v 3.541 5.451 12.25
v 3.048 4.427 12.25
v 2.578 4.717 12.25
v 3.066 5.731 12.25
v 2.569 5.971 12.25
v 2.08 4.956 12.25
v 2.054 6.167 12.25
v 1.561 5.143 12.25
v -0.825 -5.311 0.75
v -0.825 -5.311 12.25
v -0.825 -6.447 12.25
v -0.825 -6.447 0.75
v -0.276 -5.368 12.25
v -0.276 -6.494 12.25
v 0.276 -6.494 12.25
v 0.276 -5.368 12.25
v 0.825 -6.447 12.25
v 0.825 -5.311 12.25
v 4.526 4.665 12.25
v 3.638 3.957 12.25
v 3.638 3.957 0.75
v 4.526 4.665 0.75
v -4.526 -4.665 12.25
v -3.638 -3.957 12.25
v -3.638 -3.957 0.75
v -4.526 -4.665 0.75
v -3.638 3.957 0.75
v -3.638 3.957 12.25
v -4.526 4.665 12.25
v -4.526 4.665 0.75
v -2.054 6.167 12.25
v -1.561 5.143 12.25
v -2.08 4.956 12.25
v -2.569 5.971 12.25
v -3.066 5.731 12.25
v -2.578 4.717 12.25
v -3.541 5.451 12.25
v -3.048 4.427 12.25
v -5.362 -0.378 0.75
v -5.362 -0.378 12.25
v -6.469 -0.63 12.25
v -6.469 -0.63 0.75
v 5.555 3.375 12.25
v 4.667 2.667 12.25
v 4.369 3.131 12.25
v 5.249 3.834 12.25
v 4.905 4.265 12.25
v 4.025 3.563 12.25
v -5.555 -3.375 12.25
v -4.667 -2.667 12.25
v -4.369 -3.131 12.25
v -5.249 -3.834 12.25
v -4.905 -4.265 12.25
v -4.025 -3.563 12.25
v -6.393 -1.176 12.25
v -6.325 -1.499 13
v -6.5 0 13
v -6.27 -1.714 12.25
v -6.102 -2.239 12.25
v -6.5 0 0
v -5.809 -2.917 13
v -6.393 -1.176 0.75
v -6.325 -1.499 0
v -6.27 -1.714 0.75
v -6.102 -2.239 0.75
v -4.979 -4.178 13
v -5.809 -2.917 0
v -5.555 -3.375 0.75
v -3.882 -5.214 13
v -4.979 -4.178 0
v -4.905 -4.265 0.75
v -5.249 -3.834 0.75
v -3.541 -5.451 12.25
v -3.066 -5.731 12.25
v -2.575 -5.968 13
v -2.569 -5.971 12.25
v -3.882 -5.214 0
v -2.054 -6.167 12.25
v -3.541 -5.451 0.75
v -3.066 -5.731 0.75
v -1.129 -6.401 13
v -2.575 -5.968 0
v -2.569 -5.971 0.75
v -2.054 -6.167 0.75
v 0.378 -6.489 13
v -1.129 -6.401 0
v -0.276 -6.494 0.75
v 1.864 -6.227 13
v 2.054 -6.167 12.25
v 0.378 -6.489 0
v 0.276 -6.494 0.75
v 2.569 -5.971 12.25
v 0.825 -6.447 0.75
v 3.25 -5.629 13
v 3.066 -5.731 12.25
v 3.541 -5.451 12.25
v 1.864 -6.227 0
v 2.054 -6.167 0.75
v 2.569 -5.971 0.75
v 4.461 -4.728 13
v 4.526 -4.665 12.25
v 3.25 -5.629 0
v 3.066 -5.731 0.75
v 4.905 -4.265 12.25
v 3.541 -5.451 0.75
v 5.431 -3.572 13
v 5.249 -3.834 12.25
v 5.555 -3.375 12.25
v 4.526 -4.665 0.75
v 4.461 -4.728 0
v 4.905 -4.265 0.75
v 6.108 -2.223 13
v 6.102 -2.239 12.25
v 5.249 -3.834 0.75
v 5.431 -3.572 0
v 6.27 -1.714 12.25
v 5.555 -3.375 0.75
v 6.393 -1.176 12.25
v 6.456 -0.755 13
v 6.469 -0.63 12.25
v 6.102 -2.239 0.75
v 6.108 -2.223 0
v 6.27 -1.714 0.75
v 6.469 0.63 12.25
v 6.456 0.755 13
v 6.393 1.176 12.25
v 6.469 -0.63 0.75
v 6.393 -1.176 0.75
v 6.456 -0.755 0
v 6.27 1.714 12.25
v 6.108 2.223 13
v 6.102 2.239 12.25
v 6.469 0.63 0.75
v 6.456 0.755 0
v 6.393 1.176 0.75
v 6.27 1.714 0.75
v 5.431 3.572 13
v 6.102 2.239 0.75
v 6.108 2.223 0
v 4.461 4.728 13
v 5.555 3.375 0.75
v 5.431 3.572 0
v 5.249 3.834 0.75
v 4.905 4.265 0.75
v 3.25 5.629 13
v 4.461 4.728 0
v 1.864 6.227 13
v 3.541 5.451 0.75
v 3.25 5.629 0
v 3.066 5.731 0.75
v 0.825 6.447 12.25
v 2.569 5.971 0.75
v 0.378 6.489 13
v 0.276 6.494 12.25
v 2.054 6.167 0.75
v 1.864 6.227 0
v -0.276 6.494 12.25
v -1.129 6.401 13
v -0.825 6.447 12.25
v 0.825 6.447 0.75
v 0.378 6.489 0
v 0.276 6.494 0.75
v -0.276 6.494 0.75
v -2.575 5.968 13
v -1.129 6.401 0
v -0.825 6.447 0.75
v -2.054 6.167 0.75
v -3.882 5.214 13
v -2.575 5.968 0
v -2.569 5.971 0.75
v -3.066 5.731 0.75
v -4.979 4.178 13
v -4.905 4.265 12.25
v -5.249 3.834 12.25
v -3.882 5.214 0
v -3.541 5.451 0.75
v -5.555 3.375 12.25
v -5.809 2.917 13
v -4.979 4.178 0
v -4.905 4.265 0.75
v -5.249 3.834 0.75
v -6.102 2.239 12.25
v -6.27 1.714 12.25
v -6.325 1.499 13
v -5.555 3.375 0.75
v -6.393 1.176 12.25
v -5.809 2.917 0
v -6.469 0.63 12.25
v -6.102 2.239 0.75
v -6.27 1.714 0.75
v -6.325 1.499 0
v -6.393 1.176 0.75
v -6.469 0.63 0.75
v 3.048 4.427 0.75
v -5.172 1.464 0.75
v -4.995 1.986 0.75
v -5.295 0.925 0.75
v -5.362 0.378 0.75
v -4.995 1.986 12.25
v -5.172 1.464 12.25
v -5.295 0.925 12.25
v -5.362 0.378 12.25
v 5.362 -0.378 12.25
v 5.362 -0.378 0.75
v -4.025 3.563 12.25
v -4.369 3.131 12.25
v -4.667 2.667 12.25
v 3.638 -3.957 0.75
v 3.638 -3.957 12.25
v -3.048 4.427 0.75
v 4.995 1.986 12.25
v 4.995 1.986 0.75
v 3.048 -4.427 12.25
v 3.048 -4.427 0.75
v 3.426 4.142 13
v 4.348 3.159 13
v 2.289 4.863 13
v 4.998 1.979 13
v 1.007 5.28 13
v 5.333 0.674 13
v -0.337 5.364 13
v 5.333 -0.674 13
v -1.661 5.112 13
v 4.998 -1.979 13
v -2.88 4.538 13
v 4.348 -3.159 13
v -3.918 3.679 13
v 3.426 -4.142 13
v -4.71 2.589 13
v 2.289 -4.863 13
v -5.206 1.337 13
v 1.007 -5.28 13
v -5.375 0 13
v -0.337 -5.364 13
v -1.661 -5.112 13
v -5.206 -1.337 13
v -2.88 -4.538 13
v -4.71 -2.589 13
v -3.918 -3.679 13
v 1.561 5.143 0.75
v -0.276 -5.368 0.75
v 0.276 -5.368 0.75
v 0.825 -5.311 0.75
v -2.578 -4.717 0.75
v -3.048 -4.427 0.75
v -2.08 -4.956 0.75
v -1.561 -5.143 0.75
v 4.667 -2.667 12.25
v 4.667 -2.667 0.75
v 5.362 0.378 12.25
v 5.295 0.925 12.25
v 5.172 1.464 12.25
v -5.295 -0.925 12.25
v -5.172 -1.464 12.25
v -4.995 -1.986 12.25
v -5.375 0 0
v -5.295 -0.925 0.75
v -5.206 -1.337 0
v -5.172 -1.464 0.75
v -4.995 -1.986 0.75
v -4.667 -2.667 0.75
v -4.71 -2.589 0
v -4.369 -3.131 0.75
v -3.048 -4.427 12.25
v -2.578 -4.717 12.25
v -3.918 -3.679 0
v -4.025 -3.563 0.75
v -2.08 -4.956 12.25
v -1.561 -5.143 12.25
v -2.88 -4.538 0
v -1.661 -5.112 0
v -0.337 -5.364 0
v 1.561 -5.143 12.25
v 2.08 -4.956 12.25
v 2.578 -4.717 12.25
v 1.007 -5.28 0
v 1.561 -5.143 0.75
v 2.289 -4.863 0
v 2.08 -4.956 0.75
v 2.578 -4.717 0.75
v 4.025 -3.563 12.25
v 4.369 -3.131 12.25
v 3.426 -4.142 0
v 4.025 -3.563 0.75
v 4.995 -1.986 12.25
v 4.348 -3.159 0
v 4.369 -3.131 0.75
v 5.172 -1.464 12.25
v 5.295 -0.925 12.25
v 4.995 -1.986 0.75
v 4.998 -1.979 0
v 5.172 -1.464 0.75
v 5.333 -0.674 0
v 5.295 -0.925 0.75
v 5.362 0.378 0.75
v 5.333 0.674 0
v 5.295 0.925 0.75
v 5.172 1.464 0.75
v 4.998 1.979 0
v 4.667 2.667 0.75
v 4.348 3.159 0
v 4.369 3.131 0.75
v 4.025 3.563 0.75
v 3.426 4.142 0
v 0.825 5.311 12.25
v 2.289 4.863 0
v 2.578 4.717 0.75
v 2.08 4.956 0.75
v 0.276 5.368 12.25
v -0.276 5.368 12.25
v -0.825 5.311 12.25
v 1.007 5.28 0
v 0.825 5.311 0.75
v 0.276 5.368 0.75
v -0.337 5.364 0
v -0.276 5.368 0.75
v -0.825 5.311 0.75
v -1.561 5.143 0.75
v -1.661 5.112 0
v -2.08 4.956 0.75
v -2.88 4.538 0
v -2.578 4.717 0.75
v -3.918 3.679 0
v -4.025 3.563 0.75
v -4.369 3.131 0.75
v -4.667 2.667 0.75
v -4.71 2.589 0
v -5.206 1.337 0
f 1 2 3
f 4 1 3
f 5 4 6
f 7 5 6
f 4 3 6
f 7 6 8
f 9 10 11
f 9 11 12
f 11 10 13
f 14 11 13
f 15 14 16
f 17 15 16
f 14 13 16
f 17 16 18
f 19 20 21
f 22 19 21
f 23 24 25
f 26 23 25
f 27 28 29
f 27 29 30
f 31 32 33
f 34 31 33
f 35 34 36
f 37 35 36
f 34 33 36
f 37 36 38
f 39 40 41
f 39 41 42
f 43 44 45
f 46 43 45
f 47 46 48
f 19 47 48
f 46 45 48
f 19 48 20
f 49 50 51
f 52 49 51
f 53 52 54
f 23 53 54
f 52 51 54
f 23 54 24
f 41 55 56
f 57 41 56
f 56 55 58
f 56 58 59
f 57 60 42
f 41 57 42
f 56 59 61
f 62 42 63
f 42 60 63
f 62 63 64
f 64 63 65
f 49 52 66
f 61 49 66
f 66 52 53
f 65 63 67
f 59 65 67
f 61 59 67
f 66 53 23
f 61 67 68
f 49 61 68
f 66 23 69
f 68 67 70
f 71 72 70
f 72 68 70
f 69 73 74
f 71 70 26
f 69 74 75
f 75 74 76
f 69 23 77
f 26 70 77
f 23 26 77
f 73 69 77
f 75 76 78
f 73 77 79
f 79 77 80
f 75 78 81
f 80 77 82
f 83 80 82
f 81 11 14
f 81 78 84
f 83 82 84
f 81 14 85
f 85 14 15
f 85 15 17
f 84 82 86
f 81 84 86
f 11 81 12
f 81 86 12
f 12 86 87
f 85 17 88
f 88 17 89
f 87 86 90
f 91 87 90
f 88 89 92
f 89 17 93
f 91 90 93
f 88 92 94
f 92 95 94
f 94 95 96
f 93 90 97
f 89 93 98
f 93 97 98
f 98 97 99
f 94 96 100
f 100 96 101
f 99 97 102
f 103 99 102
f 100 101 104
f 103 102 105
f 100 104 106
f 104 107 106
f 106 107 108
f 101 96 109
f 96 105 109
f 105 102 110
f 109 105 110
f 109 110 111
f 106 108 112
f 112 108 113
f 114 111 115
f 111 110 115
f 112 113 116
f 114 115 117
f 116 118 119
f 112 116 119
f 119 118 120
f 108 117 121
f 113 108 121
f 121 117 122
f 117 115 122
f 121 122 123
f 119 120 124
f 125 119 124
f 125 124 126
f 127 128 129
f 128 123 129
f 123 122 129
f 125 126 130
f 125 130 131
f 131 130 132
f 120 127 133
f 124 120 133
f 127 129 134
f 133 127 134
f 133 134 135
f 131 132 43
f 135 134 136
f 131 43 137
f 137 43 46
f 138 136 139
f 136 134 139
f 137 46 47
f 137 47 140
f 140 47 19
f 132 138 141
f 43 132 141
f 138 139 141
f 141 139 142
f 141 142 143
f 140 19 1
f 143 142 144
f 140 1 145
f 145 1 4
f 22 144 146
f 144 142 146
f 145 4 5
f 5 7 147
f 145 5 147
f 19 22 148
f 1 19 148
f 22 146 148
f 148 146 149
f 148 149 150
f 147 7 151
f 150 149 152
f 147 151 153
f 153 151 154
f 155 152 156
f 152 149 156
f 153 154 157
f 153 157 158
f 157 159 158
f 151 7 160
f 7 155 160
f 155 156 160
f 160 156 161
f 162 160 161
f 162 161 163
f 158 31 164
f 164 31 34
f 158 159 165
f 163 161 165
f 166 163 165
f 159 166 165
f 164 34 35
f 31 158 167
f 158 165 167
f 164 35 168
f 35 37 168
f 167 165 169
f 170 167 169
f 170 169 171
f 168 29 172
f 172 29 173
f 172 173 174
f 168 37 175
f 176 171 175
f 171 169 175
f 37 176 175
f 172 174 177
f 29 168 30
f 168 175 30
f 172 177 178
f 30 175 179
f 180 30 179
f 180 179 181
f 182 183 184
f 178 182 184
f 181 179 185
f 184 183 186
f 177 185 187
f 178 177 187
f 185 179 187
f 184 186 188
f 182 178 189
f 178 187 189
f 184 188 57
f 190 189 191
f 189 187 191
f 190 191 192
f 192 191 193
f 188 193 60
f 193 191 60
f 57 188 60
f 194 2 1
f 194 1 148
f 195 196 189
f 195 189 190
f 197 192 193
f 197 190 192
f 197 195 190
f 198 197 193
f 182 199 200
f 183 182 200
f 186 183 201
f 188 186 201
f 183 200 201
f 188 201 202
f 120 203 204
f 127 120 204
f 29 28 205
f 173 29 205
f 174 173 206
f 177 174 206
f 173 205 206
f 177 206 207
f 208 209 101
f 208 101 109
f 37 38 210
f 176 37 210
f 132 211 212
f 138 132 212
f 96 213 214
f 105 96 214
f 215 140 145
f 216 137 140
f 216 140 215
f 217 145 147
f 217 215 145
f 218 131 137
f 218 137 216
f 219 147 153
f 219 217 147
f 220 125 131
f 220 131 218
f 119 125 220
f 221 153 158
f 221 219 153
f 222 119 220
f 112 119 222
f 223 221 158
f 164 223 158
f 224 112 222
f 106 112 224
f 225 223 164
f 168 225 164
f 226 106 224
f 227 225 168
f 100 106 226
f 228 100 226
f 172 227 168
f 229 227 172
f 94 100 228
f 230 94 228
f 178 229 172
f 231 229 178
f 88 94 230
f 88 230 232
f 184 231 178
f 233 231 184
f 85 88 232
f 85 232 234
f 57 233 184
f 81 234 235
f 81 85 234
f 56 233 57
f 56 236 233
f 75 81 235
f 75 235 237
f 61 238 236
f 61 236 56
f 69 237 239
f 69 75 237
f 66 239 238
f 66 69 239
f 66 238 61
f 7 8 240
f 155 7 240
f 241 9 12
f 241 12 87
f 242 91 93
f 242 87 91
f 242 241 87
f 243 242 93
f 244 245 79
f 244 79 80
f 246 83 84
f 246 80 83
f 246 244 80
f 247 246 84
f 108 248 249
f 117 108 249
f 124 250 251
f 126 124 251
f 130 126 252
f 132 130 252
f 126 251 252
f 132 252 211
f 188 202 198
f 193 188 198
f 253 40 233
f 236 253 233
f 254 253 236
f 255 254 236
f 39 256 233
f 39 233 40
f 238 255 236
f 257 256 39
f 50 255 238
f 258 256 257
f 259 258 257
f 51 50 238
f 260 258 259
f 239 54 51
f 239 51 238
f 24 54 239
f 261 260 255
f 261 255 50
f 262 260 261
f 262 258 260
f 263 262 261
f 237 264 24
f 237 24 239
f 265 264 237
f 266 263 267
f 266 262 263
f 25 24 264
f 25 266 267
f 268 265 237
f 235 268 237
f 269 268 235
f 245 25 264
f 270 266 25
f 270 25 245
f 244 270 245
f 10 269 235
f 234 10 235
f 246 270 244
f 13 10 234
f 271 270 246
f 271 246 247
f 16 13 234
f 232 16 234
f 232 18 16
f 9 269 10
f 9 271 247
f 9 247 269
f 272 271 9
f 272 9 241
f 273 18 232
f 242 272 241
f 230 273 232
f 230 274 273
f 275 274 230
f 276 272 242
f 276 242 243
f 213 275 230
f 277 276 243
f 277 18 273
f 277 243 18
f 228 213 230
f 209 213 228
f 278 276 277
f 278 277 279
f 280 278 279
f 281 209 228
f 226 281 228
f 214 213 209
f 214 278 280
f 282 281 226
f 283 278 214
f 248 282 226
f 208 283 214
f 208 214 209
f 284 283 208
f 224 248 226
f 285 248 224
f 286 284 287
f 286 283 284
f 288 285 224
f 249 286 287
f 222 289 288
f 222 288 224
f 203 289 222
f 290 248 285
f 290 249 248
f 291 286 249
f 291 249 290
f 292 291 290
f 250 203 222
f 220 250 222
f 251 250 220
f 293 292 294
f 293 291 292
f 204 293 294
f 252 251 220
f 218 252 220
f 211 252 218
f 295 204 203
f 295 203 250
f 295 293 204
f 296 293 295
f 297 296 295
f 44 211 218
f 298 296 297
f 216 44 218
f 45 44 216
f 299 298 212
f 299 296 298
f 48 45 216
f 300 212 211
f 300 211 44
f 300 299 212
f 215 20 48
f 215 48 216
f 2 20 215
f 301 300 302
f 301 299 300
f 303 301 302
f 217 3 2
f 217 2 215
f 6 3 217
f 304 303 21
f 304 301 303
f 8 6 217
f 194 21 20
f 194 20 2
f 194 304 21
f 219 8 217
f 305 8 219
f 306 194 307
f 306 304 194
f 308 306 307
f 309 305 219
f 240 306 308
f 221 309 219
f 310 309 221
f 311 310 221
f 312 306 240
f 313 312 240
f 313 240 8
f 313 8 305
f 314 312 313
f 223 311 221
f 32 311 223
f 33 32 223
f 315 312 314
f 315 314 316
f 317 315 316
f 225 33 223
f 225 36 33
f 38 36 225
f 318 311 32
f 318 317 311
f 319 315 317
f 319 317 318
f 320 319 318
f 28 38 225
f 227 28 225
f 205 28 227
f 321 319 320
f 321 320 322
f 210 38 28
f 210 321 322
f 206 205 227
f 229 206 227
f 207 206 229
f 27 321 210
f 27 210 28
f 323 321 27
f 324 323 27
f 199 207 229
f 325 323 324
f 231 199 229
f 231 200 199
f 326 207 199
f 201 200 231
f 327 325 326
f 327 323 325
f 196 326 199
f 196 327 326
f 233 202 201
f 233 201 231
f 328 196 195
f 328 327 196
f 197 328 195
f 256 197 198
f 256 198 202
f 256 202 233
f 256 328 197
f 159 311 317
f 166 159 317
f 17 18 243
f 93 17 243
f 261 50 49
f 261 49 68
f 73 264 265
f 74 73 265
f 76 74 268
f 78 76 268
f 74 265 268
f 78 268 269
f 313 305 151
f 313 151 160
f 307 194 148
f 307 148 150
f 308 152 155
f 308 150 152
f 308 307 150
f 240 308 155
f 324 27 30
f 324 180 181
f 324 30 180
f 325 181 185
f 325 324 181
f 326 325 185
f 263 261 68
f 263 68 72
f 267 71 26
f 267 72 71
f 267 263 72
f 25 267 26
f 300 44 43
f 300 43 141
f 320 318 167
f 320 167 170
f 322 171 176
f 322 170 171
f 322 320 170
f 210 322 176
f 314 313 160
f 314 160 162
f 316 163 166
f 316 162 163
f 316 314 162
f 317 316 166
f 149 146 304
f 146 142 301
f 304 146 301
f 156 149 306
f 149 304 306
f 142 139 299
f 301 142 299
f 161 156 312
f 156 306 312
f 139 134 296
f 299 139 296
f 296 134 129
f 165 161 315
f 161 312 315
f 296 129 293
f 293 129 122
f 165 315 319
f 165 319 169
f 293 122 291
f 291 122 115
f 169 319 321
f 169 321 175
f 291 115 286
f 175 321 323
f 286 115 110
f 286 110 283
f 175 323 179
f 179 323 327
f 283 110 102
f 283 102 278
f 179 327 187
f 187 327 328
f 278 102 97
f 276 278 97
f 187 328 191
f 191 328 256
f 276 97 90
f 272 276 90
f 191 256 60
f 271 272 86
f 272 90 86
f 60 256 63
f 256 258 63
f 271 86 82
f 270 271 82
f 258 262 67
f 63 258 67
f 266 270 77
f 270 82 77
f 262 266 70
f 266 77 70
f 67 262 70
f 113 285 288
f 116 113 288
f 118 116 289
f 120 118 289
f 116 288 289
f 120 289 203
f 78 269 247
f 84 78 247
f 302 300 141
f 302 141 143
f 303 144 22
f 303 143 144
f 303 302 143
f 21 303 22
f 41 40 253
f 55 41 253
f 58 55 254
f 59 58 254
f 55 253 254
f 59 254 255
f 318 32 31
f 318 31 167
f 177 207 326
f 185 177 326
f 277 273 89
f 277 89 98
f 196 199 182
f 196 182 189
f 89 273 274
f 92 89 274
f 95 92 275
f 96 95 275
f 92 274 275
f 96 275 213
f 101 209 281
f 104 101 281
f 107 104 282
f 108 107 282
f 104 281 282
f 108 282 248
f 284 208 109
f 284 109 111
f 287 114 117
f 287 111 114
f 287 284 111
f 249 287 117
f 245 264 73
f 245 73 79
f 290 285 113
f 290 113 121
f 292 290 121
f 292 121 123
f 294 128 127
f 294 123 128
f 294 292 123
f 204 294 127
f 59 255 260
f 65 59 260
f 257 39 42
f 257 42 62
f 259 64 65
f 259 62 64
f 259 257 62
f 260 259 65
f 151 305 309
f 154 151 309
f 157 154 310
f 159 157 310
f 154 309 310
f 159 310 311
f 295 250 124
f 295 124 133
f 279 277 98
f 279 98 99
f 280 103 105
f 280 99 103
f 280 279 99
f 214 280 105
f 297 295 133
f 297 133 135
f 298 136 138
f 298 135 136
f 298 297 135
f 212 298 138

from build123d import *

# Parameters (mm, degrees)
SKETCH_1_R               = 6.5
SKETCH_1_R_2             = 5.375
EXTRUDE_1_DEPTH          = 13
SKETCH_2_W               = 1.65
SKETCH_2_H               = 11.5
CUT_EXTRUDE_1_DEPTH      = 6.5
PATTERN_CIRCULAR_1_COUNT = 14


with BuildPart() as part:
    # Эскиз1 → Бобышка-Вытянуть1 (new body)
    with BuildSketch(Plane.XY):
        with Locations(Location((0, 0, 0), (0, 0, 180))):
            Circle(SKETCH_1_R)
        with Locations(Location((0, 0, 0), (0, 0, 180))):
            Circle(SKETCH_1_R_2, mode=Mode.SUBTRACT)
    extrude(amount=EXTRUDE_1_DEPTH)

    # Эскиз2 → Вырез-Вытянуть1 (cut)
    with BuildSketch(Plane(origin=(0, 0, 0), x_dir=(1, 0, 0), z_dir=(0, 1, 0))):
        with Locations((0, -6.5)):
            Rectangle(SKETCH_2_W, SKETCH_2_H)
    cut_extrude_1 = extrude(amount=-CUT_EXTRUDE_1_DEPTH, mode=Mode.SUBTRACT)

    # Круговой массив1: Вырез-Вытянуть1 ×14 about axis
    pattern_circular_1_axis = Axis((0, 0, 0), (0, 0, 1))
    for i in range(1, PATTERN_CIRCULAR_1_COUNT):
        add(cut_extrude_1.rotate(pattern_circular_1_axis, i * 360 / PATTERN_CIRCULAR_1_COUNT), mode=Mode.SUBTRACT)


solid = part.part
